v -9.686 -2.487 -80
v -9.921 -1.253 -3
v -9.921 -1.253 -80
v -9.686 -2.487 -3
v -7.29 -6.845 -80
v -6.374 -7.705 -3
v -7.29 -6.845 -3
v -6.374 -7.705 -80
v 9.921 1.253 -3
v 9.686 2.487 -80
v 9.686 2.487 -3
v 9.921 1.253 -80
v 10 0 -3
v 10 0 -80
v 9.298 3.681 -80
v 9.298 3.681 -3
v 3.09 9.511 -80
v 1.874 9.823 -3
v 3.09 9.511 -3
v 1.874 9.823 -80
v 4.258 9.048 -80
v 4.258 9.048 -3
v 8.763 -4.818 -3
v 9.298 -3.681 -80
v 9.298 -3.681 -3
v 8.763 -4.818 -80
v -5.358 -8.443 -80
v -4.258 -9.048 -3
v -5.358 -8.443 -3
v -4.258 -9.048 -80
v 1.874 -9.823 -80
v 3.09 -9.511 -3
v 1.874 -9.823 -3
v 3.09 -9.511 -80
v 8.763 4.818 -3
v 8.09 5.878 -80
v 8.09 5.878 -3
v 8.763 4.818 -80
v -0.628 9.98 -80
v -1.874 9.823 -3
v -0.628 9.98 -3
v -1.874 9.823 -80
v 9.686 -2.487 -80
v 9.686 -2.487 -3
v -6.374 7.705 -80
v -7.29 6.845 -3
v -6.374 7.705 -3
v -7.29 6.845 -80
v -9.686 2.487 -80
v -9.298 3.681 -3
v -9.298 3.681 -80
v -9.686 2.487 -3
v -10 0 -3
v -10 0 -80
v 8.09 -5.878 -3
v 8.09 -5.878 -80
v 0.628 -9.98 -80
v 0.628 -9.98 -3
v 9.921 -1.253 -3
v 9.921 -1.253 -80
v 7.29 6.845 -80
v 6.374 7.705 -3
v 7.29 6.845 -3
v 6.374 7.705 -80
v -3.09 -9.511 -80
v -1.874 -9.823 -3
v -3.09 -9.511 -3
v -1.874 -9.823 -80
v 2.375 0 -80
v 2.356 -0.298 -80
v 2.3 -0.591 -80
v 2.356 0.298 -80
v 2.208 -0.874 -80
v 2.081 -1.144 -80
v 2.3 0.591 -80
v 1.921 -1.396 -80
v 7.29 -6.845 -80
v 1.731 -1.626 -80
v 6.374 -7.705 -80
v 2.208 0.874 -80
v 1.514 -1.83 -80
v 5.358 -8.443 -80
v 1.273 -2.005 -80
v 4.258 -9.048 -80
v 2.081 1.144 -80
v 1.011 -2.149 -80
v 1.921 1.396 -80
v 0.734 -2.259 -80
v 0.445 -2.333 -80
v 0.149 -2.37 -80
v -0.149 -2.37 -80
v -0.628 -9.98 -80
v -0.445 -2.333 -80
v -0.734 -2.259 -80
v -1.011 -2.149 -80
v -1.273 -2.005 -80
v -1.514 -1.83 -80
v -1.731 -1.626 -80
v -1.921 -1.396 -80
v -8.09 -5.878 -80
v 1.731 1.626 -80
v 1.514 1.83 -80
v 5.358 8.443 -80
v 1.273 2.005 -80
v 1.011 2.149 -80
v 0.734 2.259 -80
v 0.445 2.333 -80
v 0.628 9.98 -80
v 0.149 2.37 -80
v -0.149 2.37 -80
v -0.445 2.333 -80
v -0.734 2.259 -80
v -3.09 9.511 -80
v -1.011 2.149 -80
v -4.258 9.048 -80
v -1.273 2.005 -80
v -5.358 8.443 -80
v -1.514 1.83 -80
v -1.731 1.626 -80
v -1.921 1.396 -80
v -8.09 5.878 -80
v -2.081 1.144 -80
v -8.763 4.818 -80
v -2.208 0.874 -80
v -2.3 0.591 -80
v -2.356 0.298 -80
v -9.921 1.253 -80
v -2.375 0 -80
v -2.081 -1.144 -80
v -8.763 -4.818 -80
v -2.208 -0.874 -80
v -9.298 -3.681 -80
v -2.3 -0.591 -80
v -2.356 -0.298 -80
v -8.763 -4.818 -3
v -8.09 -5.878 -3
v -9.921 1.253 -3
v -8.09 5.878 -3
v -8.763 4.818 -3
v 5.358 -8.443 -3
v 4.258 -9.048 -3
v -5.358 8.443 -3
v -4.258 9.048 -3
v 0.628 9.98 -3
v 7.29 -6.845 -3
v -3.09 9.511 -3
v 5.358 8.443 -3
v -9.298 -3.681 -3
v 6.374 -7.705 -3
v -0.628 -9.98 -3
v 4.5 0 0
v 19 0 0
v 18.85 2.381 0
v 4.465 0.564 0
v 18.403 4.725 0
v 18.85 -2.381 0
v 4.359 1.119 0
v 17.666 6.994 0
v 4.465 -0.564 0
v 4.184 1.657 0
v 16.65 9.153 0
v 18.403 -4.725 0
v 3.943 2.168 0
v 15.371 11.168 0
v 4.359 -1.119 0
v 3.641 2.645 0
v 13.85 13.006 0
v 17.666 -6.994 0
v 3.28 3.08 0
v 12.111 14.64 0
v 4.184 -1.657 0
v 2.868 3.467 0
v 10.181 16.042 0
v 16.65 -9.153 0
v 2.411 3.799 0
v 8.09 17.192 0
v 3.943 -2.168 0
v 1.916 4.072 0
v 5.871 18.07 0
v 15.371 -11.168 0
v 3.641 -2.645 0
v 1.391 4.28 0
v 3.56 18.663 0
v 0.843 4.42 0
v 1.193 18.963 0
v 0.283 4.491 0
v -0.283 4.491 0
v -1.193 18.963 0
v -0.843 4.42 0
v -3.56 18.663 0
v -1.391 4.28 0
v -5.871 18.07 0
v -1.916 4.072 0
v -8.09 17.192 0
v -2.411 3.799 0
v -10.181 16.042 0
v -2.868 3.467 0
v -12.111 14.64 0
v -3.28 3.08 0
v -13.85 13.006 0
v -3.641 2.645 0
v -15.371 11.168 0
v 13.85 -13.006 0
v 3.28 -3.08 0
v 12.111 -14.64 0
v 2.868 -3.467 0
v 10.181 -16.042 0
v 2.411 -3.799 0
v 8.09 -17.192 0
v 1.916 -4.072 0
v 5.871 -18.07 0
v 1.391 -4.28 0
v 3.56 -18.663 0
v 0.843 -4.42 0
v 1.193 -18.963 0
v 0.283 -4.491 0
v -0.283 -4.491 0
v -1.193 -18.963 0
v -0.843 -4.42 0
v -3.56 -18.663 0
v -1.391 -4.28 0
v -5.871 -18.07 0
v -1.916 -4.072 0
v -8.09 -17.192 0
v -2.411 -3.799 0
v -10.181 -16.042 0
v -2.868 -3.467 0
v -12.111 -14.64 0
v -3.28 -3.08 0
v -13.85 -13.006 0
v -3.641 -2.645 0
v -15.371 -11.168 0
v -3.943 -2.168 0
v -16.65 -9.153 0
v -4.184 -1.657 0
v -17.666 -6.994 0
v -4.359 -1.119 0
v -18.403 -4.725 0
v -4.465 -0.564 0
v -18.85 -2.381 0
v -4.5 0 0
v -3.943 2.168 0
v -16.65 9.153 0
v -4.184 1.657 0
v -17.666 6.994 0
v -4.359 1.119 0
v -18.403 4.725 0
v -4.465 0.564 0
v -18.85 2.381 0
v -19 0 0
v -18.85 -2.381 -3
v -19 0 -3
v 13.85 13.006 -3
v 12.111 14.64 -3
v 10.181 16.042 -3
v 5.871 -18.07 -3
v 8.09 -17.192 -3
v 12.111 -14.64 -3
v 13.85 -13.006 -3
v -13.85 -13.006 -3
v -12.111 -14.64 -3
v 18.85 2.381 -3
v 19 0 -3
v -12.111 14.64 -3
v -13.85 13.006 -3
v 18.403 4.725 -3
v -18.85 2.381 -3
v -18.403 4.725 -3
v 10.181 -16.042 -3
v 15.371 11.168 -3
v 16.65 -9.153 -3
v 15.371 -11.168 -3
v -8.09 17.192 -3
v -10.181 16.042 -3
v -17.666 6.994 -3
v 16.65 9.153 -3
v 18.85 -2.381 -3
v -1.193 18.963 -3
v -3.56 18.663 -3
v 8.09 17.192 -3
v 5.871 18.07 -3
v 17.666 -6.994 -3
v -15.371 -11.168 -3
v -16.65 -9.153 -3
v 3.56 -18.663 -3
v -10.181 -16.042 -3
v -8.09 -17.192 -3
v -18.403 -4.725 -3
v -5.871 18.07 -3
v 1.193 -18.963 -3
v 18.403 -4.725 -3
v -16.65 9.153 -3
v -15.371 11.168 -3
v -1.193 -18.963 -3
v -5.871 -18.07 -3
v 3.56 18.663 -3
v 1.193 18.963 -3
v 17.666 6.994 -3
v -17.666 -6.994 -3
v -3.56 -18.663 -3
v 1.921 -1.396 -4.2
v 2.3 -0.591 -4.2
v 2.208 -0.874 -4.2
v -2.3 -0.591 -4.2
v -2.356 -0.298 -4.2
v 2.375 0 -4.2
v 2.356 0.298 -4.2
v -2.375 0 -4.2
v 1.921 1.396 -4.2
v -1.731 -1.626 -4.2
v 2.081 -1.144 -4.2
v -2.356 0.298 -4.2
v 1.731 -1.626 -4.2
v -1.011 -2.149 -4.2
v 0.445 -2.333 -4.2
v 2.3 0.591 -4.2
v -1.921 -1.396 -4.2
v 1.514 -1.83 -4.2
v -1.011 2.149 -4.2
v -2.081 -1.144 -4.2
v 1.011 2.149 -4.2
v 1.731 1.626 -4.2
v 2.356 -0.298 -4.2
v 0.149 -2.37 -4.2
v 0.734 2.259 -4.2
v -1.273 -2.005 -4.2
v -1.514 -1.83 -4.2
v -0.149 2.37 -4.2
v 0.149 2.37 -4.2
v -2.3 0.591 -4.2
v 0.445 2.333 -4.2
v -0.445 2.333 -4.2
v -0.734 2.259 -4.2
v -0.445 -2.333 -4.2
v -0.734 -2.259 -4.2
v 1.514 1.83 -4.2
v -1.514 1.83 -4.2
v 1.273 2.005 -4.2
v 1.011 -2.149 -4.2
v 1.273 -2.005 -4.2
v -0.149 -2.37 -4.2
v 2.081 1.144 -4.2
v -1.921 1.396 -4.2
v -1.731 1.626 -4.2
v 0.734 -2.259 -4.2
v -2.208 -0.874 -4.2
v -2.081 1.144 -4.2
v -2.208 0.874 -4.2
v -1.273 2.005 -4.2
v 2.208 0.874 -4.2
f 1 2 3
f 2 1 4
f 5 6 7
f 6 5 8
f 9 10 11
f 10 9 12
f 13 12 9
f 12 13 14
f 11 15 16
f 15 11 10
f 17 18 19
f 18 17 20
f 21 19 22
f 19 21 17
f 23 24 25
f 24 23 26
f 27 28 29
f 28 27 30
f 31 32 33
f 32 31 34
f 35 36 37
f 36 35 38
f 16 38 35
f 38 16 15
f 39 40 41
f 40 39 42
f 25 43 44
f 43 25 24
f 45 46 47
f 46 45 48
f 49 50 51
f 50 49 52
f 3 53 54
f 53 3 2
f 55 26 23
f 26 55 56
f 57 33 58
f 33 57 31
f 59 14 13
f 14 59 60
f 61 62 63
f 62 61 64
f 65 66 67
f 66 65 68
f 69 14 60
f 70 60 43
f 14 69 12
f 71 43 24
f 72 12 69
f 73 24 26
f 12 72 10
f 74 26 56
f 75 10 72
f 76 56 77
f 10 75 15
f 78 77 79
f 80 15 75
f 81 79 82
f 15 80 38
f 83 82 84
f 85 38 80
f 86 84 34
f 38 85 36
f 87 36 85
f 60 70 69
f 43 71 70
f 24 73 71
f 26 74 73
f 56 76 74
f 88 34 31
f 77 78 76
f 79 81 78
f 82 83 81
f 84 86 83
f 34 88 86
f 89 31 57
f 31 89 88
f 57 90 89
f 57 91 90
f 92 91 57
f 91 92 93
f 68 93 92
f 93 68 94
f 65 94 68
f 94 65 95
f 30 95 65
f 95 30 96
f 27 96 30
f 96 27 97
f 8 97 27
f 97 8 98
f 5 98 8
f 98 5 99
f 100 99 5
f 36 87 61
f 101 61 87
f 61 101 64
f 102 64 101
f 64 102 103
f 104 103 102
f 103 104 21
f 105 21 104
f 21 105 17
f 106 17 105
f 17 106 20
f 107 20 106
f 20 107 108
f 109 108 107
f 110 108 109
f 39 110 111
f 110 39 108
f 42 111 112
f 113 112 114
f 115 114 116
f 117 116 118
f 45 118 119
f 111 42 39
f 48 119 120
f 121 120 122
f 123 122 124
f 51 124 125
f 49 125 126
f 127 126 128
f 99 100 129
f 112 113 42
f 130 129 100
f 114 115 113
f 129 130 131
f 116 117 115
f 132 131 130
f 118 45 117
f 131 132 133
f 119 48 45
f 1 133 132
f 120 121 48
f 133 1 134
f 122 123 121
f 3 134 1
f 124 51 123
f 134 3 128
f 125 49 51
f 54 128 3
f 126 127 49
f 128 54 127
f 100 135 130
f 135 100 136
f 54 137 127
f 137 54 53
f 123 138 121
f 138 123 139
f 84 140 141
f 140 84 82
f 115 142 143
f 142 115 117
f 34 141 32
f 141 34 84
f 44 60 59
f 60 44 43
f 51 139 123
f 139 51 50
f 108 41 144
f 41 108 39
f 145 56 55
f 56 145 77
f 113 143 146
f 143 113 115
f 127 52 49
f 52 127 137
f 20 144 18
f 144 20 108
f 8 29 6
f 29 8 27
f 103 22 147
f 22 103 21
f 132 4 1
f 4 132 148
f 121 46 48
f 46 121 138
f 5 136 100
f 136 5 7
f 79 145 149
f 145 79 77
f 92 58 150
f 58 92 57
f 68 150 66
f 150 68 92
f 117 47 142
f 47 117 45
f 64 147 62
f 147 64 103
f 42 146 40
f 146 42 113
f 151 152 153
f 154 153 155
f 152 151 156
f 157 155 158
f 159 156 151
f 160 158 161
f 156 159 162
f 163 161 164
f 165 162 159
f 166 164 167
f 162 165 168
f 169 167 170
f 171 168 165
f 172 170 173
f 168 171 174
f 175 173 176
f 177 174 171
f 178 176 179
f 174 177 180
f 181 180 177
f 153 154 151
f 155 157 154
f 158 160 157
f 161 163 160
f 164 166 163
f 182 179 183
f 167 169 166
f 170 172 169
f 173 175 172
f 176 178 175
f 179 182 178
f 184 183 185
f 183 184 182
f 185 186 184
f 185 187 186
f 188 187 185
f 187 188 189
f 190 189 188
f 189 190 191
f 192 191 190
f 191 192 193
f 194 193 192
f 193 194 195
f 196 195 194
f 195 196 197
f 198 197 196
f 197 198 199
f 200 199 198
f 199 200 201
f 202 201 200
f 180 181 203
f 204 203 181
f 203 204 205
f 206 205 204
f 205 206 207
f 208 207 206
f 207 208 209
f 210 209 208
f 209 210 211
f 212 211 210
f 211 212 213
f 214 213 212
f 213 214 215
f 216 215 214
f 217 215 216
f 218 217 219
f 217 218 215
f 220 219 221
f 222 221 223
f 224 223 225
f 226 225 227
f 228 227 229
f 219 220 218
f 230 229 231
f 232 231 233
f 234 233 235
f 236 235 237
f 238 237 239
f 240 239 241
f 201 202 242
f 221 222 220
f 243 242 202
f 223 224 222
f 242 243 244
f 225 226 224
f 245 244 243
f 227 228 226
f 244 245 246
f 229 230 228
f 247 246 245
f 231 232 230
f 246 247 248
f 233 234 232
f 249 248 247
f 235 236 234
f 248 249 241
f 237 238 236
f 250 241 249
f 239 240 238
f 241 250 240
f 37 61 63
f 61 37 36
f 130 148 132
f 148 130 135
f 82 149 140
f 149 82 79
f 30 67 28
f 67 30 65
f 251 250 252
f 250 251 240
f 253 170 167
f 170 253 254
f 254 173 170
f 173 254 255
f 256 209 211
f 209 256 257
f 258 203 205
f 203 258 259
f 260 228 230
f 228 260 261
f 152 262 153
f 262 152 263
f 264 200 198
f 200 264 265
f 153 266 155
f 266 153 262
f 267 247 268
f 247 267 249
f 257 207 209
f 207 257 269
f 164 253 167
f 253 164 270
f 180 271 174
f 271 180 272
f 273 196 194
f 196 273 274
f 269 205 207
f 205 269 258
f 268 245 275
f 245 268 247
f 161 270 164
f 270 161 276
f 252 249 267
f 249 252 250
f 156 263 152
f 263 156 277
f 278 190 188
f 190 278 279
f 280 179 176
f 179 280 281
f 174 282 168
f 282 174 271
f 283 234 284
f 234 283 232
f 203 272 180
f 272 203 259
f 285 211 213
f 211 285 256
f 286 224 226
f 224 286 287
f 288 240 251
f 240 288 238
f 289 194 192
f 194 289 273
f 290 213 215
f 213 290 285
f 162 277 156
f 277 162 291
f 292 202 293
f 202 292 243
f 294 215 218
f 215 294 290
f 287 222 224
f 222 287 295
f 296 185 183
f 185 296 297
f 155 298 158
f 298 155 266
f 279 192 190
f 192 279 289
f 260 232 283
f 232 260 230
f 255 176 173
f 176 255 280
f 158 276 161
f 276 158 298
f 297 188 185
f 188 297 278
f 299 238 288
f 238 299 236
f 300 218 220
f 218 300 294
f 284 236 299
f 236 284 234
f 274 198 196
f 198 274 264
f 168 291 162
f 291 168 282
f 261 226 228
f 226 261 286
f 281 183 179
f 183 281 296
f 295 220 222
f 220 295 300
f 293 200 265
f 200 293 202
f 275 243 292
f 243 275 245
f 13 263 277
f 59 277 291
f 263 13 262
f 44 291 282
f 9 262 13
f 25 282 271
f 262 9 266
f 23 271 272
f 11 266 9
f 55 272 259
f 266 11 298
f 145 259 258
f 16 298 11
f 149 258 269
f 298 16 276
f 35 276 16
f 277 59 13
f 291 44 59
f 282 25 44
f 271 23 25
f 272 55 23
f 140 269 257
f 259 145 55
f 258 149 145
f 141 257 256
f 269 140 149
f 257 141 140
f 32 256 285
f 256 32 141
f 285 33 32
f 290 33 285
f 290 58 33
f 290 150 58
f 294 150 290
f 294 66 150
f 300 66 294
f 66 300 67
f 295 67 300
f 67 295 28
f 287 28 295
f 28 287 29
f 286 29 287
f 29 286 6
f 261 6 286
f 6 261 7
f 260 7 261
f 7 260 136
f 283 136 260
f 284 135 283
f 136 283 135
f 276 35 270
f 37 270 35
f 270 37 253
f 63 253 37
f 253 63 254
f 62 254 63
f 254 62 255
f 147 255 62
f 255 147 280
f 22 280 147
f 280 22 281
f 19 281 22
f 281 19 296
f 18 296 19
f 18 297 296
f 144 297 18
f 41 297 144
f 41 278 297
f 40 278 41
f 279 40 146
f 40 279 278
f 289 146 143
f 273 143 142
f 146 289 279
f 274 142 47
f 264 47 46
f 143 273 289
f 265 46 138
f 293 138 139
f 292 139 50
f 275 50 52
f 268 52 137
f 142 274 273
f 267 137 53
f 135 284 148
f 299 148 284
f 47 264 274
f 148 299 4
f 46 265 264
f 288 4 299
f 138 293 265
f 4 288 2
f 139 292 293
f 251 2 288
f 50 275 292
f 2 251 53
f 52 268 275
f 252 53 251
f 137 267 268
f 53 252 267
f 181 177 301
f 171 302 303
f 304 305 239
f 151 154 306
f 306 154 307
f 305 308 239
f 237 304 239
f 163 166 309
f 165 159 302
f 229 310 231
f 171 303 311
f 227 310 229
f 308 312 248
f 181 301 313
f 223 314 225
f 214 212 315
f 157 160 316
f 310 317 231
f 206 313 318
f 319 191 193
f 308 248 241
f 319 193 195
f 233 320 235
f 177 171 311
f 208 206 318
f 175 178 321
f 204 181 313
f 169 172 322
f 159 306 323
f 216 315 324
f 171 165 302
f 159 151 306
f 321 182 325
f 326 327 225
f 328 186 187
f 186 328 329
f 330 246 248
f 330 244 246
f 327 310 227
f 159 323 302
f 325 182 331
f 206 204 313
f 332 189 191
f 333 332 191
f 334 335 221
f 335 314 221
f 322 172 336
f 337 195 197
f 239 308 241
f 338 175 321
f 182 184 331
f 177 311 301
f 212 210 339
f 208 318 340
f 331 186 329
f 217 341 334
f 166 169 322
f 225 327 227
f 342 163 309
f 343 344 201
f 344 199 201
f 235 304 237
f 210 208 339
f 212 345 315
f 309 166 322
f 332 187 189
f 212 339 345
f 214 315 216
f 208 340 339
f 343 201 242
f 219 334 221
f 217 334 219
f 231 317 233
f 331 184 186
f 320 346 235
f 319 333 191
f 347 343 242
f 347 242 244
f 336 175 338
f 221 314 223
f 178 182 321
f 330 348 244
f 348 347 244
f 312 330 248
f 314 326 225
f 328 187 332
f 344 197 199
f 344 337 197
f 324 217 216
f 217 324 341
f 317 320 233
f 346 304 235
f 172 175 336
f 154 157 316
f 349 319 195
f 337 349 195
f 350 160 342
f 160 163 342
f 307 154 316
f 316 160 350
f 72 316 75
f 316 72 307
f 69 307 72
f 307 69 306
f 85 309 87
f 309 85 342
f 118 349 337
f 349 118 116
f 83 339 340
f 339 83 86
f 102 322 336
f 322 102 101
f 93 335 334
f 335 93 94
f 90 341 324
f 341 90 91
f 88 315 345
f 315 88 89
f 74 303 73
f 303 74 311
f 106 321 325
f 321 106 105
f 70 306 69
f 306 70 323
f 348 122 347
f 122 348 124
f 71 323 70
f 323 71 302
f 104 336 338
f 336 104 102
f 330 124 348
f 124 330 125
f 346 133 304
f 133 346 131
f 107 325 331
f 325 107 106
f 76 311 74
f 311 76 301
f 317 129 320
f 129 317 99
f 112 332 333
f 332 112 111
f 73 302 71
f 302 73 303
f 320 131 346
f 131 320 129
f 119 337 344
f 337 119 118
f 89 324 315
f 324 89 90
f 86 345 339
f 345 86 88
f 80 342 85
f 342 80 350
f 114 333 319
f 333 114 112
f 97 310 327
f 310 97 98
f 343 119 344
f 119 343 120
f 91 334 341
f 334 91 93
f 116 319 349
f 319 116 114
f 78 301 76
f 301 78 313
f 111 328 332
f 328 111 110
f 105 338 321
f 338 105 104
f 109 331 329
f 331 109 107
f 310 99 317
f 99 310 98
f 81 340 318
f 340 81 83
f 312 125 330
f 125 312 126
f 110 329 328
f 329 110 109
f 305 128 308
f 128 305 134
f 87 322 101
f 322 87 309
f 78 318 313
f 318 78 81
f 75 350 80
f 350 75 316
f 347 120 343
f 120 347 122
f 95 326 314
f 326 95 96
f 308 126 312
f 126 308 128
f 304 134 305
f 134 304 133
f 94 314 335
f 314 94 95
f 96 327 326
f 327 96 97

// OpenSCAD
$fn = 50;


difference() {
	union() {
		translate(v = [0, 0, -80.0000000000]) {
			cylinder(h = 80, r = 10.0000000000);
		}
		translate(v = [0, 0, -3.0000000000]) {
			cylinder(h = 3, r = 19.0000000000);
		}
	}
	union() {
		translate(v = [0, 0, 0]) {
			rotate(a = [0, 0, 0]) {
				difference() {
					union() {
						#translate(v = [0, 0, -80.0000000000]) {
							cylinder(h = 80, r = 2.2500000000);
						}
						#translate(v = [0, 0, -4.2000000000]) {
							cylinder(h = 4.2000000000, r = 10.0000000000, r1 = 2.3750000000, r2 = 4.5000000000);
						}
						#translate(v = [0, 0, -80.0000000000]) {
							cylinder(h = 80, r = 2.3750000000);
						}
						#translate(v = [0, 0, -80.0000000000]) {
							cylinder(h = 80, r = 2.2500000000);
						}
					}
					union();
				}
			}
		}
	}
}
